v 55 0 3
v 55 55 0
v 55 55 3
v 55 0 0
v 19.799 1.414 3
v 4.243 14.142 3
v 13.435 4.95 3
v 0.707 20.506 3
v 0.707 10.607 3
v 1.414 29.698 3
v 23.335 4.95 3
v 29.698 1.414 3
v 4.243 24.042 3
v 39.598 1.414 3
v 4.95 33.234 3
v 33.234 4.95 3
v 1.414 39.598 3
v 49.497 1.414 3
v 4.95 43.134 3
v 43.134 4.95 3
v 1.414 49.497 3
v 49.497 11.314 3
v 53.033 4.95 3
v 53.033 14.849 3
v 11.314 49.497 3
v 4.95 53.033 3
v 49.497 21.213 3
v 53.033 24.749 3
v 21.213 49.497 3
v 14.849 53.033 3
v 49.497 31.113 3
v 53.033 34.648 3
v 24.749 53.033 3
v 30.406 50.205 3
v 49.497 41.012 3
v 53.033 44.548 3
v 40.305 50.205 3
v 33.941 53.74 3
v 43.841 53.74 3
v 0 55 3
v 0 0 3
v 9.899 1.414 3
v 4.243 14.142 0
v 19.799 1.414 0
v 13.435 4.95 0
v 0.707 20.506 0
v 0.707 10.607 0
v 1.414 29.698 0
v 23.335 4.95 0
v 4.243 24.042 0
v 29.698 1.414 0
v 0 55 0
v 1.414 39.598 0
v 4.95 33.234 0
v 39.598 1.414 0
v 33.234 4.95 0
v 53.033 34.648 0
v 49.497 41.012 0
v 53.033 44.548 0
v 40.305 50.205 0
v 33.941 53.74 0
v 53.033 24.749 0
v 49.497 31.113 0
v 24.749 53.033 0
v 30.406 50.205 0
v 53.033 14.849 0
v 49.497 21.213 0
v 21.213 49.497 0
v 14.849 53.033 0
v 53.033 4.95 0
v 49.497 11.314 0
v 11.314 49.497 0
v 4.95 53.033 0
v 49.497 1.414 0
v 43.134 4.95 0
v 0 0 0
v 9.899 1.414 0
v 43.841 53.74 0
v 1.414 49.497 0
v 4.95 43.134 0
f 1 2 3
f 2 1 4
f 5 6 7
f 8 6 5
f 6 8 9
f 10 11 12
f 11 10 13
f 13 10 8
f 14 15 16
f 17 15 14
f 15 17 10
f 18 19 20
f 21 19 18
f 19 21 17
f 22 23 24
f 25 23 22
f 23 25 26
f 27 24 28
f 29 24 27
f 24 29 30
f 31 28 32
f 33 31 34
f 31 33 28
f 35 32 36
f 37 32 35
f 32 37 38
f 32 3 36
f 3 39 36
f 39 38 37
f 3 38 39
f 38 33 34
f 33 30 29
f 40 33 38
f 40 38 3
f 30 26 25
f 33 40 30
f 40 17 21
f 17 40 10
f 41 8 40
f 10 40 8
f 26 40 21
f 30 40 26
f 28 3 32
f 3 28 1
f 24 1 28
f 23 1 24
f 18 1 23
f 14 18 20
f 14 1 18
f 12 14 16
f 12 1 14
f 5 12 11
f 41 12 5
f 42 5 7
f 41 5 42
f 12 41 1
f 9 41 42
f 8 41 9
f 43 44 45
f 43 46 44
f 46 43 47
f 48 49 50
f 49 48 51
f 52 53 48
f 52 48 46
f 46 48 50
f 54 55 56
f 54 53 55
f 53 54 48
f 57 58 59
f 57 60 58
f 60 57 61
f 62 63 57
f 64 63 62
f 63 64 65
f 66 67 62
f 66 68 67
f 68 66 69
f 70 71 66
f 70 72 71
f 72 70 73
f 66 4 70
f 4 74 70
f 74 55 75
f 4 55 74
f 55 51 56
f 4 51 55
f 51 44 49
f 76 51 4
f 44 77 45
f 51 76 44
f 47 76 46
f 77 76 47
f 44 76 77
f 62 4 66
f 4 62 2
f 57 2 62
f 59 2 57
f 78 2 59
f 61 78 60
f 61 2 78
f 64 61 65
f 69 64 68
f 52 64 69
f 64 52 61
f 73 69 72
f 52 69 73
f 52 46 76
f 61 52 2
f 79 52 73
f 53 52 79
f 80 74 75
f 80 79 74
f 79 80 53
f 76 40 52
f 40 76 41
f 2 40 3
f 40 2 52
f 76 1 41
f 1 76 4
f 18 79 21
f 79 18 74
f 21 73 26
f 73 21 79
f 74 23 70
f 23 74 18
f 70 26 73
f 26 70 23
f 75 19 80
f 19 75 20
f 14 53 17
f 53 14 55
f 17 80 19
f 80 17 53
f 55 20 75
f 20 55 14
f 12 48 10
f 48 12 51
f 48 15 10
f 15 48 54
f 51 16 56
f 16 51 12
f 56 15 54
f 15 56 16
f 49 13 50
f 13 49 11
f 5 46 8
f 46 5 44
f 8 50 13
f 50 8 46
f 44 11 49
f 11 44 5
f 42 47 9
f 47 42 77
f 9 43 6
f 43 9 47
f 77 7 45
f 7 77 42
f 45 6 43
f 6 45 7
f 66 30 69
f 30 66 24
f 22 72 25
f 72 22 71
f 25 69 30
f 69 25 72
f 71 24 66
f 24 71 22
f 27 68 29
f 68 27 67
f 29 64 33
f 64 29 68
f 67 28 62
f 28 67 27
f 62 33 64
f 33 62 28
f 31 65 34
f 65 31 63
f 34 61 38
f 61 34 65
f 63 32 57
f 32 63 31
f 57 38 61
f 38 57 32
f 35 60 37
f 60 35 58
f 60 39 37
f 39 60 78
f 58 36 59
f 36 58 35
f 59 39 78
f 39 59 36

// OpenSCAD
w = 55;
h = 55;
d = 3;

hw=5;
hw_gap=3;
count=w / (hw + hw_gap);

difference(){
cube([w, h, d]);
rotate([0, 0, 45]) {  
    color("green")
    translate([36,-34, -1])
    cube([hw,h+13,d+2]);
}
difference(){
rotate([0, 0 , 45]) {  
    color("red")
    translate([29,-27, -1])
    cube([hw,h-1,d+2]);
}
}
difference(){
rotate([0, 0 , 45]) {  
    color("red")
    translate([22,-20, -1])
    cube([hw,h-15,d+2]);
}
}
difference(){
rotate([0, 0 , 45]) {  
    color("red")
    translate([15,-13, -1])
    cube([hw,h-28,d+2]);
}
}
difference(){
rotate([0, 0 , 45]) {  
    color("red")
    translate([8,-6, -1])
    cube([hw,h-42,d+2]);
}
}
difference(){
rotate([0, 0 , 45]) {  
    color("green")
    translate([43,-27, -1])
    cube([hw,h-1,d+2]);
}
}
difference(){
rotate([0, 0 , 45]) {  
    color("green")
    translate([50,-20, -1])
    cube([hw,h-15,d+2]);
}
}
difference(){
rotate([0, 0 , 45]) {  
    color("green")
    translate([57,-13, -1])
    cube([hw,h-28,d+2]);
}
}
difference(){
rotate([0, 0 , 45]) {  
    color("green")
    translate([64,-6, -1])
    cube([hw,h-42,d+2]);
}
}
}
